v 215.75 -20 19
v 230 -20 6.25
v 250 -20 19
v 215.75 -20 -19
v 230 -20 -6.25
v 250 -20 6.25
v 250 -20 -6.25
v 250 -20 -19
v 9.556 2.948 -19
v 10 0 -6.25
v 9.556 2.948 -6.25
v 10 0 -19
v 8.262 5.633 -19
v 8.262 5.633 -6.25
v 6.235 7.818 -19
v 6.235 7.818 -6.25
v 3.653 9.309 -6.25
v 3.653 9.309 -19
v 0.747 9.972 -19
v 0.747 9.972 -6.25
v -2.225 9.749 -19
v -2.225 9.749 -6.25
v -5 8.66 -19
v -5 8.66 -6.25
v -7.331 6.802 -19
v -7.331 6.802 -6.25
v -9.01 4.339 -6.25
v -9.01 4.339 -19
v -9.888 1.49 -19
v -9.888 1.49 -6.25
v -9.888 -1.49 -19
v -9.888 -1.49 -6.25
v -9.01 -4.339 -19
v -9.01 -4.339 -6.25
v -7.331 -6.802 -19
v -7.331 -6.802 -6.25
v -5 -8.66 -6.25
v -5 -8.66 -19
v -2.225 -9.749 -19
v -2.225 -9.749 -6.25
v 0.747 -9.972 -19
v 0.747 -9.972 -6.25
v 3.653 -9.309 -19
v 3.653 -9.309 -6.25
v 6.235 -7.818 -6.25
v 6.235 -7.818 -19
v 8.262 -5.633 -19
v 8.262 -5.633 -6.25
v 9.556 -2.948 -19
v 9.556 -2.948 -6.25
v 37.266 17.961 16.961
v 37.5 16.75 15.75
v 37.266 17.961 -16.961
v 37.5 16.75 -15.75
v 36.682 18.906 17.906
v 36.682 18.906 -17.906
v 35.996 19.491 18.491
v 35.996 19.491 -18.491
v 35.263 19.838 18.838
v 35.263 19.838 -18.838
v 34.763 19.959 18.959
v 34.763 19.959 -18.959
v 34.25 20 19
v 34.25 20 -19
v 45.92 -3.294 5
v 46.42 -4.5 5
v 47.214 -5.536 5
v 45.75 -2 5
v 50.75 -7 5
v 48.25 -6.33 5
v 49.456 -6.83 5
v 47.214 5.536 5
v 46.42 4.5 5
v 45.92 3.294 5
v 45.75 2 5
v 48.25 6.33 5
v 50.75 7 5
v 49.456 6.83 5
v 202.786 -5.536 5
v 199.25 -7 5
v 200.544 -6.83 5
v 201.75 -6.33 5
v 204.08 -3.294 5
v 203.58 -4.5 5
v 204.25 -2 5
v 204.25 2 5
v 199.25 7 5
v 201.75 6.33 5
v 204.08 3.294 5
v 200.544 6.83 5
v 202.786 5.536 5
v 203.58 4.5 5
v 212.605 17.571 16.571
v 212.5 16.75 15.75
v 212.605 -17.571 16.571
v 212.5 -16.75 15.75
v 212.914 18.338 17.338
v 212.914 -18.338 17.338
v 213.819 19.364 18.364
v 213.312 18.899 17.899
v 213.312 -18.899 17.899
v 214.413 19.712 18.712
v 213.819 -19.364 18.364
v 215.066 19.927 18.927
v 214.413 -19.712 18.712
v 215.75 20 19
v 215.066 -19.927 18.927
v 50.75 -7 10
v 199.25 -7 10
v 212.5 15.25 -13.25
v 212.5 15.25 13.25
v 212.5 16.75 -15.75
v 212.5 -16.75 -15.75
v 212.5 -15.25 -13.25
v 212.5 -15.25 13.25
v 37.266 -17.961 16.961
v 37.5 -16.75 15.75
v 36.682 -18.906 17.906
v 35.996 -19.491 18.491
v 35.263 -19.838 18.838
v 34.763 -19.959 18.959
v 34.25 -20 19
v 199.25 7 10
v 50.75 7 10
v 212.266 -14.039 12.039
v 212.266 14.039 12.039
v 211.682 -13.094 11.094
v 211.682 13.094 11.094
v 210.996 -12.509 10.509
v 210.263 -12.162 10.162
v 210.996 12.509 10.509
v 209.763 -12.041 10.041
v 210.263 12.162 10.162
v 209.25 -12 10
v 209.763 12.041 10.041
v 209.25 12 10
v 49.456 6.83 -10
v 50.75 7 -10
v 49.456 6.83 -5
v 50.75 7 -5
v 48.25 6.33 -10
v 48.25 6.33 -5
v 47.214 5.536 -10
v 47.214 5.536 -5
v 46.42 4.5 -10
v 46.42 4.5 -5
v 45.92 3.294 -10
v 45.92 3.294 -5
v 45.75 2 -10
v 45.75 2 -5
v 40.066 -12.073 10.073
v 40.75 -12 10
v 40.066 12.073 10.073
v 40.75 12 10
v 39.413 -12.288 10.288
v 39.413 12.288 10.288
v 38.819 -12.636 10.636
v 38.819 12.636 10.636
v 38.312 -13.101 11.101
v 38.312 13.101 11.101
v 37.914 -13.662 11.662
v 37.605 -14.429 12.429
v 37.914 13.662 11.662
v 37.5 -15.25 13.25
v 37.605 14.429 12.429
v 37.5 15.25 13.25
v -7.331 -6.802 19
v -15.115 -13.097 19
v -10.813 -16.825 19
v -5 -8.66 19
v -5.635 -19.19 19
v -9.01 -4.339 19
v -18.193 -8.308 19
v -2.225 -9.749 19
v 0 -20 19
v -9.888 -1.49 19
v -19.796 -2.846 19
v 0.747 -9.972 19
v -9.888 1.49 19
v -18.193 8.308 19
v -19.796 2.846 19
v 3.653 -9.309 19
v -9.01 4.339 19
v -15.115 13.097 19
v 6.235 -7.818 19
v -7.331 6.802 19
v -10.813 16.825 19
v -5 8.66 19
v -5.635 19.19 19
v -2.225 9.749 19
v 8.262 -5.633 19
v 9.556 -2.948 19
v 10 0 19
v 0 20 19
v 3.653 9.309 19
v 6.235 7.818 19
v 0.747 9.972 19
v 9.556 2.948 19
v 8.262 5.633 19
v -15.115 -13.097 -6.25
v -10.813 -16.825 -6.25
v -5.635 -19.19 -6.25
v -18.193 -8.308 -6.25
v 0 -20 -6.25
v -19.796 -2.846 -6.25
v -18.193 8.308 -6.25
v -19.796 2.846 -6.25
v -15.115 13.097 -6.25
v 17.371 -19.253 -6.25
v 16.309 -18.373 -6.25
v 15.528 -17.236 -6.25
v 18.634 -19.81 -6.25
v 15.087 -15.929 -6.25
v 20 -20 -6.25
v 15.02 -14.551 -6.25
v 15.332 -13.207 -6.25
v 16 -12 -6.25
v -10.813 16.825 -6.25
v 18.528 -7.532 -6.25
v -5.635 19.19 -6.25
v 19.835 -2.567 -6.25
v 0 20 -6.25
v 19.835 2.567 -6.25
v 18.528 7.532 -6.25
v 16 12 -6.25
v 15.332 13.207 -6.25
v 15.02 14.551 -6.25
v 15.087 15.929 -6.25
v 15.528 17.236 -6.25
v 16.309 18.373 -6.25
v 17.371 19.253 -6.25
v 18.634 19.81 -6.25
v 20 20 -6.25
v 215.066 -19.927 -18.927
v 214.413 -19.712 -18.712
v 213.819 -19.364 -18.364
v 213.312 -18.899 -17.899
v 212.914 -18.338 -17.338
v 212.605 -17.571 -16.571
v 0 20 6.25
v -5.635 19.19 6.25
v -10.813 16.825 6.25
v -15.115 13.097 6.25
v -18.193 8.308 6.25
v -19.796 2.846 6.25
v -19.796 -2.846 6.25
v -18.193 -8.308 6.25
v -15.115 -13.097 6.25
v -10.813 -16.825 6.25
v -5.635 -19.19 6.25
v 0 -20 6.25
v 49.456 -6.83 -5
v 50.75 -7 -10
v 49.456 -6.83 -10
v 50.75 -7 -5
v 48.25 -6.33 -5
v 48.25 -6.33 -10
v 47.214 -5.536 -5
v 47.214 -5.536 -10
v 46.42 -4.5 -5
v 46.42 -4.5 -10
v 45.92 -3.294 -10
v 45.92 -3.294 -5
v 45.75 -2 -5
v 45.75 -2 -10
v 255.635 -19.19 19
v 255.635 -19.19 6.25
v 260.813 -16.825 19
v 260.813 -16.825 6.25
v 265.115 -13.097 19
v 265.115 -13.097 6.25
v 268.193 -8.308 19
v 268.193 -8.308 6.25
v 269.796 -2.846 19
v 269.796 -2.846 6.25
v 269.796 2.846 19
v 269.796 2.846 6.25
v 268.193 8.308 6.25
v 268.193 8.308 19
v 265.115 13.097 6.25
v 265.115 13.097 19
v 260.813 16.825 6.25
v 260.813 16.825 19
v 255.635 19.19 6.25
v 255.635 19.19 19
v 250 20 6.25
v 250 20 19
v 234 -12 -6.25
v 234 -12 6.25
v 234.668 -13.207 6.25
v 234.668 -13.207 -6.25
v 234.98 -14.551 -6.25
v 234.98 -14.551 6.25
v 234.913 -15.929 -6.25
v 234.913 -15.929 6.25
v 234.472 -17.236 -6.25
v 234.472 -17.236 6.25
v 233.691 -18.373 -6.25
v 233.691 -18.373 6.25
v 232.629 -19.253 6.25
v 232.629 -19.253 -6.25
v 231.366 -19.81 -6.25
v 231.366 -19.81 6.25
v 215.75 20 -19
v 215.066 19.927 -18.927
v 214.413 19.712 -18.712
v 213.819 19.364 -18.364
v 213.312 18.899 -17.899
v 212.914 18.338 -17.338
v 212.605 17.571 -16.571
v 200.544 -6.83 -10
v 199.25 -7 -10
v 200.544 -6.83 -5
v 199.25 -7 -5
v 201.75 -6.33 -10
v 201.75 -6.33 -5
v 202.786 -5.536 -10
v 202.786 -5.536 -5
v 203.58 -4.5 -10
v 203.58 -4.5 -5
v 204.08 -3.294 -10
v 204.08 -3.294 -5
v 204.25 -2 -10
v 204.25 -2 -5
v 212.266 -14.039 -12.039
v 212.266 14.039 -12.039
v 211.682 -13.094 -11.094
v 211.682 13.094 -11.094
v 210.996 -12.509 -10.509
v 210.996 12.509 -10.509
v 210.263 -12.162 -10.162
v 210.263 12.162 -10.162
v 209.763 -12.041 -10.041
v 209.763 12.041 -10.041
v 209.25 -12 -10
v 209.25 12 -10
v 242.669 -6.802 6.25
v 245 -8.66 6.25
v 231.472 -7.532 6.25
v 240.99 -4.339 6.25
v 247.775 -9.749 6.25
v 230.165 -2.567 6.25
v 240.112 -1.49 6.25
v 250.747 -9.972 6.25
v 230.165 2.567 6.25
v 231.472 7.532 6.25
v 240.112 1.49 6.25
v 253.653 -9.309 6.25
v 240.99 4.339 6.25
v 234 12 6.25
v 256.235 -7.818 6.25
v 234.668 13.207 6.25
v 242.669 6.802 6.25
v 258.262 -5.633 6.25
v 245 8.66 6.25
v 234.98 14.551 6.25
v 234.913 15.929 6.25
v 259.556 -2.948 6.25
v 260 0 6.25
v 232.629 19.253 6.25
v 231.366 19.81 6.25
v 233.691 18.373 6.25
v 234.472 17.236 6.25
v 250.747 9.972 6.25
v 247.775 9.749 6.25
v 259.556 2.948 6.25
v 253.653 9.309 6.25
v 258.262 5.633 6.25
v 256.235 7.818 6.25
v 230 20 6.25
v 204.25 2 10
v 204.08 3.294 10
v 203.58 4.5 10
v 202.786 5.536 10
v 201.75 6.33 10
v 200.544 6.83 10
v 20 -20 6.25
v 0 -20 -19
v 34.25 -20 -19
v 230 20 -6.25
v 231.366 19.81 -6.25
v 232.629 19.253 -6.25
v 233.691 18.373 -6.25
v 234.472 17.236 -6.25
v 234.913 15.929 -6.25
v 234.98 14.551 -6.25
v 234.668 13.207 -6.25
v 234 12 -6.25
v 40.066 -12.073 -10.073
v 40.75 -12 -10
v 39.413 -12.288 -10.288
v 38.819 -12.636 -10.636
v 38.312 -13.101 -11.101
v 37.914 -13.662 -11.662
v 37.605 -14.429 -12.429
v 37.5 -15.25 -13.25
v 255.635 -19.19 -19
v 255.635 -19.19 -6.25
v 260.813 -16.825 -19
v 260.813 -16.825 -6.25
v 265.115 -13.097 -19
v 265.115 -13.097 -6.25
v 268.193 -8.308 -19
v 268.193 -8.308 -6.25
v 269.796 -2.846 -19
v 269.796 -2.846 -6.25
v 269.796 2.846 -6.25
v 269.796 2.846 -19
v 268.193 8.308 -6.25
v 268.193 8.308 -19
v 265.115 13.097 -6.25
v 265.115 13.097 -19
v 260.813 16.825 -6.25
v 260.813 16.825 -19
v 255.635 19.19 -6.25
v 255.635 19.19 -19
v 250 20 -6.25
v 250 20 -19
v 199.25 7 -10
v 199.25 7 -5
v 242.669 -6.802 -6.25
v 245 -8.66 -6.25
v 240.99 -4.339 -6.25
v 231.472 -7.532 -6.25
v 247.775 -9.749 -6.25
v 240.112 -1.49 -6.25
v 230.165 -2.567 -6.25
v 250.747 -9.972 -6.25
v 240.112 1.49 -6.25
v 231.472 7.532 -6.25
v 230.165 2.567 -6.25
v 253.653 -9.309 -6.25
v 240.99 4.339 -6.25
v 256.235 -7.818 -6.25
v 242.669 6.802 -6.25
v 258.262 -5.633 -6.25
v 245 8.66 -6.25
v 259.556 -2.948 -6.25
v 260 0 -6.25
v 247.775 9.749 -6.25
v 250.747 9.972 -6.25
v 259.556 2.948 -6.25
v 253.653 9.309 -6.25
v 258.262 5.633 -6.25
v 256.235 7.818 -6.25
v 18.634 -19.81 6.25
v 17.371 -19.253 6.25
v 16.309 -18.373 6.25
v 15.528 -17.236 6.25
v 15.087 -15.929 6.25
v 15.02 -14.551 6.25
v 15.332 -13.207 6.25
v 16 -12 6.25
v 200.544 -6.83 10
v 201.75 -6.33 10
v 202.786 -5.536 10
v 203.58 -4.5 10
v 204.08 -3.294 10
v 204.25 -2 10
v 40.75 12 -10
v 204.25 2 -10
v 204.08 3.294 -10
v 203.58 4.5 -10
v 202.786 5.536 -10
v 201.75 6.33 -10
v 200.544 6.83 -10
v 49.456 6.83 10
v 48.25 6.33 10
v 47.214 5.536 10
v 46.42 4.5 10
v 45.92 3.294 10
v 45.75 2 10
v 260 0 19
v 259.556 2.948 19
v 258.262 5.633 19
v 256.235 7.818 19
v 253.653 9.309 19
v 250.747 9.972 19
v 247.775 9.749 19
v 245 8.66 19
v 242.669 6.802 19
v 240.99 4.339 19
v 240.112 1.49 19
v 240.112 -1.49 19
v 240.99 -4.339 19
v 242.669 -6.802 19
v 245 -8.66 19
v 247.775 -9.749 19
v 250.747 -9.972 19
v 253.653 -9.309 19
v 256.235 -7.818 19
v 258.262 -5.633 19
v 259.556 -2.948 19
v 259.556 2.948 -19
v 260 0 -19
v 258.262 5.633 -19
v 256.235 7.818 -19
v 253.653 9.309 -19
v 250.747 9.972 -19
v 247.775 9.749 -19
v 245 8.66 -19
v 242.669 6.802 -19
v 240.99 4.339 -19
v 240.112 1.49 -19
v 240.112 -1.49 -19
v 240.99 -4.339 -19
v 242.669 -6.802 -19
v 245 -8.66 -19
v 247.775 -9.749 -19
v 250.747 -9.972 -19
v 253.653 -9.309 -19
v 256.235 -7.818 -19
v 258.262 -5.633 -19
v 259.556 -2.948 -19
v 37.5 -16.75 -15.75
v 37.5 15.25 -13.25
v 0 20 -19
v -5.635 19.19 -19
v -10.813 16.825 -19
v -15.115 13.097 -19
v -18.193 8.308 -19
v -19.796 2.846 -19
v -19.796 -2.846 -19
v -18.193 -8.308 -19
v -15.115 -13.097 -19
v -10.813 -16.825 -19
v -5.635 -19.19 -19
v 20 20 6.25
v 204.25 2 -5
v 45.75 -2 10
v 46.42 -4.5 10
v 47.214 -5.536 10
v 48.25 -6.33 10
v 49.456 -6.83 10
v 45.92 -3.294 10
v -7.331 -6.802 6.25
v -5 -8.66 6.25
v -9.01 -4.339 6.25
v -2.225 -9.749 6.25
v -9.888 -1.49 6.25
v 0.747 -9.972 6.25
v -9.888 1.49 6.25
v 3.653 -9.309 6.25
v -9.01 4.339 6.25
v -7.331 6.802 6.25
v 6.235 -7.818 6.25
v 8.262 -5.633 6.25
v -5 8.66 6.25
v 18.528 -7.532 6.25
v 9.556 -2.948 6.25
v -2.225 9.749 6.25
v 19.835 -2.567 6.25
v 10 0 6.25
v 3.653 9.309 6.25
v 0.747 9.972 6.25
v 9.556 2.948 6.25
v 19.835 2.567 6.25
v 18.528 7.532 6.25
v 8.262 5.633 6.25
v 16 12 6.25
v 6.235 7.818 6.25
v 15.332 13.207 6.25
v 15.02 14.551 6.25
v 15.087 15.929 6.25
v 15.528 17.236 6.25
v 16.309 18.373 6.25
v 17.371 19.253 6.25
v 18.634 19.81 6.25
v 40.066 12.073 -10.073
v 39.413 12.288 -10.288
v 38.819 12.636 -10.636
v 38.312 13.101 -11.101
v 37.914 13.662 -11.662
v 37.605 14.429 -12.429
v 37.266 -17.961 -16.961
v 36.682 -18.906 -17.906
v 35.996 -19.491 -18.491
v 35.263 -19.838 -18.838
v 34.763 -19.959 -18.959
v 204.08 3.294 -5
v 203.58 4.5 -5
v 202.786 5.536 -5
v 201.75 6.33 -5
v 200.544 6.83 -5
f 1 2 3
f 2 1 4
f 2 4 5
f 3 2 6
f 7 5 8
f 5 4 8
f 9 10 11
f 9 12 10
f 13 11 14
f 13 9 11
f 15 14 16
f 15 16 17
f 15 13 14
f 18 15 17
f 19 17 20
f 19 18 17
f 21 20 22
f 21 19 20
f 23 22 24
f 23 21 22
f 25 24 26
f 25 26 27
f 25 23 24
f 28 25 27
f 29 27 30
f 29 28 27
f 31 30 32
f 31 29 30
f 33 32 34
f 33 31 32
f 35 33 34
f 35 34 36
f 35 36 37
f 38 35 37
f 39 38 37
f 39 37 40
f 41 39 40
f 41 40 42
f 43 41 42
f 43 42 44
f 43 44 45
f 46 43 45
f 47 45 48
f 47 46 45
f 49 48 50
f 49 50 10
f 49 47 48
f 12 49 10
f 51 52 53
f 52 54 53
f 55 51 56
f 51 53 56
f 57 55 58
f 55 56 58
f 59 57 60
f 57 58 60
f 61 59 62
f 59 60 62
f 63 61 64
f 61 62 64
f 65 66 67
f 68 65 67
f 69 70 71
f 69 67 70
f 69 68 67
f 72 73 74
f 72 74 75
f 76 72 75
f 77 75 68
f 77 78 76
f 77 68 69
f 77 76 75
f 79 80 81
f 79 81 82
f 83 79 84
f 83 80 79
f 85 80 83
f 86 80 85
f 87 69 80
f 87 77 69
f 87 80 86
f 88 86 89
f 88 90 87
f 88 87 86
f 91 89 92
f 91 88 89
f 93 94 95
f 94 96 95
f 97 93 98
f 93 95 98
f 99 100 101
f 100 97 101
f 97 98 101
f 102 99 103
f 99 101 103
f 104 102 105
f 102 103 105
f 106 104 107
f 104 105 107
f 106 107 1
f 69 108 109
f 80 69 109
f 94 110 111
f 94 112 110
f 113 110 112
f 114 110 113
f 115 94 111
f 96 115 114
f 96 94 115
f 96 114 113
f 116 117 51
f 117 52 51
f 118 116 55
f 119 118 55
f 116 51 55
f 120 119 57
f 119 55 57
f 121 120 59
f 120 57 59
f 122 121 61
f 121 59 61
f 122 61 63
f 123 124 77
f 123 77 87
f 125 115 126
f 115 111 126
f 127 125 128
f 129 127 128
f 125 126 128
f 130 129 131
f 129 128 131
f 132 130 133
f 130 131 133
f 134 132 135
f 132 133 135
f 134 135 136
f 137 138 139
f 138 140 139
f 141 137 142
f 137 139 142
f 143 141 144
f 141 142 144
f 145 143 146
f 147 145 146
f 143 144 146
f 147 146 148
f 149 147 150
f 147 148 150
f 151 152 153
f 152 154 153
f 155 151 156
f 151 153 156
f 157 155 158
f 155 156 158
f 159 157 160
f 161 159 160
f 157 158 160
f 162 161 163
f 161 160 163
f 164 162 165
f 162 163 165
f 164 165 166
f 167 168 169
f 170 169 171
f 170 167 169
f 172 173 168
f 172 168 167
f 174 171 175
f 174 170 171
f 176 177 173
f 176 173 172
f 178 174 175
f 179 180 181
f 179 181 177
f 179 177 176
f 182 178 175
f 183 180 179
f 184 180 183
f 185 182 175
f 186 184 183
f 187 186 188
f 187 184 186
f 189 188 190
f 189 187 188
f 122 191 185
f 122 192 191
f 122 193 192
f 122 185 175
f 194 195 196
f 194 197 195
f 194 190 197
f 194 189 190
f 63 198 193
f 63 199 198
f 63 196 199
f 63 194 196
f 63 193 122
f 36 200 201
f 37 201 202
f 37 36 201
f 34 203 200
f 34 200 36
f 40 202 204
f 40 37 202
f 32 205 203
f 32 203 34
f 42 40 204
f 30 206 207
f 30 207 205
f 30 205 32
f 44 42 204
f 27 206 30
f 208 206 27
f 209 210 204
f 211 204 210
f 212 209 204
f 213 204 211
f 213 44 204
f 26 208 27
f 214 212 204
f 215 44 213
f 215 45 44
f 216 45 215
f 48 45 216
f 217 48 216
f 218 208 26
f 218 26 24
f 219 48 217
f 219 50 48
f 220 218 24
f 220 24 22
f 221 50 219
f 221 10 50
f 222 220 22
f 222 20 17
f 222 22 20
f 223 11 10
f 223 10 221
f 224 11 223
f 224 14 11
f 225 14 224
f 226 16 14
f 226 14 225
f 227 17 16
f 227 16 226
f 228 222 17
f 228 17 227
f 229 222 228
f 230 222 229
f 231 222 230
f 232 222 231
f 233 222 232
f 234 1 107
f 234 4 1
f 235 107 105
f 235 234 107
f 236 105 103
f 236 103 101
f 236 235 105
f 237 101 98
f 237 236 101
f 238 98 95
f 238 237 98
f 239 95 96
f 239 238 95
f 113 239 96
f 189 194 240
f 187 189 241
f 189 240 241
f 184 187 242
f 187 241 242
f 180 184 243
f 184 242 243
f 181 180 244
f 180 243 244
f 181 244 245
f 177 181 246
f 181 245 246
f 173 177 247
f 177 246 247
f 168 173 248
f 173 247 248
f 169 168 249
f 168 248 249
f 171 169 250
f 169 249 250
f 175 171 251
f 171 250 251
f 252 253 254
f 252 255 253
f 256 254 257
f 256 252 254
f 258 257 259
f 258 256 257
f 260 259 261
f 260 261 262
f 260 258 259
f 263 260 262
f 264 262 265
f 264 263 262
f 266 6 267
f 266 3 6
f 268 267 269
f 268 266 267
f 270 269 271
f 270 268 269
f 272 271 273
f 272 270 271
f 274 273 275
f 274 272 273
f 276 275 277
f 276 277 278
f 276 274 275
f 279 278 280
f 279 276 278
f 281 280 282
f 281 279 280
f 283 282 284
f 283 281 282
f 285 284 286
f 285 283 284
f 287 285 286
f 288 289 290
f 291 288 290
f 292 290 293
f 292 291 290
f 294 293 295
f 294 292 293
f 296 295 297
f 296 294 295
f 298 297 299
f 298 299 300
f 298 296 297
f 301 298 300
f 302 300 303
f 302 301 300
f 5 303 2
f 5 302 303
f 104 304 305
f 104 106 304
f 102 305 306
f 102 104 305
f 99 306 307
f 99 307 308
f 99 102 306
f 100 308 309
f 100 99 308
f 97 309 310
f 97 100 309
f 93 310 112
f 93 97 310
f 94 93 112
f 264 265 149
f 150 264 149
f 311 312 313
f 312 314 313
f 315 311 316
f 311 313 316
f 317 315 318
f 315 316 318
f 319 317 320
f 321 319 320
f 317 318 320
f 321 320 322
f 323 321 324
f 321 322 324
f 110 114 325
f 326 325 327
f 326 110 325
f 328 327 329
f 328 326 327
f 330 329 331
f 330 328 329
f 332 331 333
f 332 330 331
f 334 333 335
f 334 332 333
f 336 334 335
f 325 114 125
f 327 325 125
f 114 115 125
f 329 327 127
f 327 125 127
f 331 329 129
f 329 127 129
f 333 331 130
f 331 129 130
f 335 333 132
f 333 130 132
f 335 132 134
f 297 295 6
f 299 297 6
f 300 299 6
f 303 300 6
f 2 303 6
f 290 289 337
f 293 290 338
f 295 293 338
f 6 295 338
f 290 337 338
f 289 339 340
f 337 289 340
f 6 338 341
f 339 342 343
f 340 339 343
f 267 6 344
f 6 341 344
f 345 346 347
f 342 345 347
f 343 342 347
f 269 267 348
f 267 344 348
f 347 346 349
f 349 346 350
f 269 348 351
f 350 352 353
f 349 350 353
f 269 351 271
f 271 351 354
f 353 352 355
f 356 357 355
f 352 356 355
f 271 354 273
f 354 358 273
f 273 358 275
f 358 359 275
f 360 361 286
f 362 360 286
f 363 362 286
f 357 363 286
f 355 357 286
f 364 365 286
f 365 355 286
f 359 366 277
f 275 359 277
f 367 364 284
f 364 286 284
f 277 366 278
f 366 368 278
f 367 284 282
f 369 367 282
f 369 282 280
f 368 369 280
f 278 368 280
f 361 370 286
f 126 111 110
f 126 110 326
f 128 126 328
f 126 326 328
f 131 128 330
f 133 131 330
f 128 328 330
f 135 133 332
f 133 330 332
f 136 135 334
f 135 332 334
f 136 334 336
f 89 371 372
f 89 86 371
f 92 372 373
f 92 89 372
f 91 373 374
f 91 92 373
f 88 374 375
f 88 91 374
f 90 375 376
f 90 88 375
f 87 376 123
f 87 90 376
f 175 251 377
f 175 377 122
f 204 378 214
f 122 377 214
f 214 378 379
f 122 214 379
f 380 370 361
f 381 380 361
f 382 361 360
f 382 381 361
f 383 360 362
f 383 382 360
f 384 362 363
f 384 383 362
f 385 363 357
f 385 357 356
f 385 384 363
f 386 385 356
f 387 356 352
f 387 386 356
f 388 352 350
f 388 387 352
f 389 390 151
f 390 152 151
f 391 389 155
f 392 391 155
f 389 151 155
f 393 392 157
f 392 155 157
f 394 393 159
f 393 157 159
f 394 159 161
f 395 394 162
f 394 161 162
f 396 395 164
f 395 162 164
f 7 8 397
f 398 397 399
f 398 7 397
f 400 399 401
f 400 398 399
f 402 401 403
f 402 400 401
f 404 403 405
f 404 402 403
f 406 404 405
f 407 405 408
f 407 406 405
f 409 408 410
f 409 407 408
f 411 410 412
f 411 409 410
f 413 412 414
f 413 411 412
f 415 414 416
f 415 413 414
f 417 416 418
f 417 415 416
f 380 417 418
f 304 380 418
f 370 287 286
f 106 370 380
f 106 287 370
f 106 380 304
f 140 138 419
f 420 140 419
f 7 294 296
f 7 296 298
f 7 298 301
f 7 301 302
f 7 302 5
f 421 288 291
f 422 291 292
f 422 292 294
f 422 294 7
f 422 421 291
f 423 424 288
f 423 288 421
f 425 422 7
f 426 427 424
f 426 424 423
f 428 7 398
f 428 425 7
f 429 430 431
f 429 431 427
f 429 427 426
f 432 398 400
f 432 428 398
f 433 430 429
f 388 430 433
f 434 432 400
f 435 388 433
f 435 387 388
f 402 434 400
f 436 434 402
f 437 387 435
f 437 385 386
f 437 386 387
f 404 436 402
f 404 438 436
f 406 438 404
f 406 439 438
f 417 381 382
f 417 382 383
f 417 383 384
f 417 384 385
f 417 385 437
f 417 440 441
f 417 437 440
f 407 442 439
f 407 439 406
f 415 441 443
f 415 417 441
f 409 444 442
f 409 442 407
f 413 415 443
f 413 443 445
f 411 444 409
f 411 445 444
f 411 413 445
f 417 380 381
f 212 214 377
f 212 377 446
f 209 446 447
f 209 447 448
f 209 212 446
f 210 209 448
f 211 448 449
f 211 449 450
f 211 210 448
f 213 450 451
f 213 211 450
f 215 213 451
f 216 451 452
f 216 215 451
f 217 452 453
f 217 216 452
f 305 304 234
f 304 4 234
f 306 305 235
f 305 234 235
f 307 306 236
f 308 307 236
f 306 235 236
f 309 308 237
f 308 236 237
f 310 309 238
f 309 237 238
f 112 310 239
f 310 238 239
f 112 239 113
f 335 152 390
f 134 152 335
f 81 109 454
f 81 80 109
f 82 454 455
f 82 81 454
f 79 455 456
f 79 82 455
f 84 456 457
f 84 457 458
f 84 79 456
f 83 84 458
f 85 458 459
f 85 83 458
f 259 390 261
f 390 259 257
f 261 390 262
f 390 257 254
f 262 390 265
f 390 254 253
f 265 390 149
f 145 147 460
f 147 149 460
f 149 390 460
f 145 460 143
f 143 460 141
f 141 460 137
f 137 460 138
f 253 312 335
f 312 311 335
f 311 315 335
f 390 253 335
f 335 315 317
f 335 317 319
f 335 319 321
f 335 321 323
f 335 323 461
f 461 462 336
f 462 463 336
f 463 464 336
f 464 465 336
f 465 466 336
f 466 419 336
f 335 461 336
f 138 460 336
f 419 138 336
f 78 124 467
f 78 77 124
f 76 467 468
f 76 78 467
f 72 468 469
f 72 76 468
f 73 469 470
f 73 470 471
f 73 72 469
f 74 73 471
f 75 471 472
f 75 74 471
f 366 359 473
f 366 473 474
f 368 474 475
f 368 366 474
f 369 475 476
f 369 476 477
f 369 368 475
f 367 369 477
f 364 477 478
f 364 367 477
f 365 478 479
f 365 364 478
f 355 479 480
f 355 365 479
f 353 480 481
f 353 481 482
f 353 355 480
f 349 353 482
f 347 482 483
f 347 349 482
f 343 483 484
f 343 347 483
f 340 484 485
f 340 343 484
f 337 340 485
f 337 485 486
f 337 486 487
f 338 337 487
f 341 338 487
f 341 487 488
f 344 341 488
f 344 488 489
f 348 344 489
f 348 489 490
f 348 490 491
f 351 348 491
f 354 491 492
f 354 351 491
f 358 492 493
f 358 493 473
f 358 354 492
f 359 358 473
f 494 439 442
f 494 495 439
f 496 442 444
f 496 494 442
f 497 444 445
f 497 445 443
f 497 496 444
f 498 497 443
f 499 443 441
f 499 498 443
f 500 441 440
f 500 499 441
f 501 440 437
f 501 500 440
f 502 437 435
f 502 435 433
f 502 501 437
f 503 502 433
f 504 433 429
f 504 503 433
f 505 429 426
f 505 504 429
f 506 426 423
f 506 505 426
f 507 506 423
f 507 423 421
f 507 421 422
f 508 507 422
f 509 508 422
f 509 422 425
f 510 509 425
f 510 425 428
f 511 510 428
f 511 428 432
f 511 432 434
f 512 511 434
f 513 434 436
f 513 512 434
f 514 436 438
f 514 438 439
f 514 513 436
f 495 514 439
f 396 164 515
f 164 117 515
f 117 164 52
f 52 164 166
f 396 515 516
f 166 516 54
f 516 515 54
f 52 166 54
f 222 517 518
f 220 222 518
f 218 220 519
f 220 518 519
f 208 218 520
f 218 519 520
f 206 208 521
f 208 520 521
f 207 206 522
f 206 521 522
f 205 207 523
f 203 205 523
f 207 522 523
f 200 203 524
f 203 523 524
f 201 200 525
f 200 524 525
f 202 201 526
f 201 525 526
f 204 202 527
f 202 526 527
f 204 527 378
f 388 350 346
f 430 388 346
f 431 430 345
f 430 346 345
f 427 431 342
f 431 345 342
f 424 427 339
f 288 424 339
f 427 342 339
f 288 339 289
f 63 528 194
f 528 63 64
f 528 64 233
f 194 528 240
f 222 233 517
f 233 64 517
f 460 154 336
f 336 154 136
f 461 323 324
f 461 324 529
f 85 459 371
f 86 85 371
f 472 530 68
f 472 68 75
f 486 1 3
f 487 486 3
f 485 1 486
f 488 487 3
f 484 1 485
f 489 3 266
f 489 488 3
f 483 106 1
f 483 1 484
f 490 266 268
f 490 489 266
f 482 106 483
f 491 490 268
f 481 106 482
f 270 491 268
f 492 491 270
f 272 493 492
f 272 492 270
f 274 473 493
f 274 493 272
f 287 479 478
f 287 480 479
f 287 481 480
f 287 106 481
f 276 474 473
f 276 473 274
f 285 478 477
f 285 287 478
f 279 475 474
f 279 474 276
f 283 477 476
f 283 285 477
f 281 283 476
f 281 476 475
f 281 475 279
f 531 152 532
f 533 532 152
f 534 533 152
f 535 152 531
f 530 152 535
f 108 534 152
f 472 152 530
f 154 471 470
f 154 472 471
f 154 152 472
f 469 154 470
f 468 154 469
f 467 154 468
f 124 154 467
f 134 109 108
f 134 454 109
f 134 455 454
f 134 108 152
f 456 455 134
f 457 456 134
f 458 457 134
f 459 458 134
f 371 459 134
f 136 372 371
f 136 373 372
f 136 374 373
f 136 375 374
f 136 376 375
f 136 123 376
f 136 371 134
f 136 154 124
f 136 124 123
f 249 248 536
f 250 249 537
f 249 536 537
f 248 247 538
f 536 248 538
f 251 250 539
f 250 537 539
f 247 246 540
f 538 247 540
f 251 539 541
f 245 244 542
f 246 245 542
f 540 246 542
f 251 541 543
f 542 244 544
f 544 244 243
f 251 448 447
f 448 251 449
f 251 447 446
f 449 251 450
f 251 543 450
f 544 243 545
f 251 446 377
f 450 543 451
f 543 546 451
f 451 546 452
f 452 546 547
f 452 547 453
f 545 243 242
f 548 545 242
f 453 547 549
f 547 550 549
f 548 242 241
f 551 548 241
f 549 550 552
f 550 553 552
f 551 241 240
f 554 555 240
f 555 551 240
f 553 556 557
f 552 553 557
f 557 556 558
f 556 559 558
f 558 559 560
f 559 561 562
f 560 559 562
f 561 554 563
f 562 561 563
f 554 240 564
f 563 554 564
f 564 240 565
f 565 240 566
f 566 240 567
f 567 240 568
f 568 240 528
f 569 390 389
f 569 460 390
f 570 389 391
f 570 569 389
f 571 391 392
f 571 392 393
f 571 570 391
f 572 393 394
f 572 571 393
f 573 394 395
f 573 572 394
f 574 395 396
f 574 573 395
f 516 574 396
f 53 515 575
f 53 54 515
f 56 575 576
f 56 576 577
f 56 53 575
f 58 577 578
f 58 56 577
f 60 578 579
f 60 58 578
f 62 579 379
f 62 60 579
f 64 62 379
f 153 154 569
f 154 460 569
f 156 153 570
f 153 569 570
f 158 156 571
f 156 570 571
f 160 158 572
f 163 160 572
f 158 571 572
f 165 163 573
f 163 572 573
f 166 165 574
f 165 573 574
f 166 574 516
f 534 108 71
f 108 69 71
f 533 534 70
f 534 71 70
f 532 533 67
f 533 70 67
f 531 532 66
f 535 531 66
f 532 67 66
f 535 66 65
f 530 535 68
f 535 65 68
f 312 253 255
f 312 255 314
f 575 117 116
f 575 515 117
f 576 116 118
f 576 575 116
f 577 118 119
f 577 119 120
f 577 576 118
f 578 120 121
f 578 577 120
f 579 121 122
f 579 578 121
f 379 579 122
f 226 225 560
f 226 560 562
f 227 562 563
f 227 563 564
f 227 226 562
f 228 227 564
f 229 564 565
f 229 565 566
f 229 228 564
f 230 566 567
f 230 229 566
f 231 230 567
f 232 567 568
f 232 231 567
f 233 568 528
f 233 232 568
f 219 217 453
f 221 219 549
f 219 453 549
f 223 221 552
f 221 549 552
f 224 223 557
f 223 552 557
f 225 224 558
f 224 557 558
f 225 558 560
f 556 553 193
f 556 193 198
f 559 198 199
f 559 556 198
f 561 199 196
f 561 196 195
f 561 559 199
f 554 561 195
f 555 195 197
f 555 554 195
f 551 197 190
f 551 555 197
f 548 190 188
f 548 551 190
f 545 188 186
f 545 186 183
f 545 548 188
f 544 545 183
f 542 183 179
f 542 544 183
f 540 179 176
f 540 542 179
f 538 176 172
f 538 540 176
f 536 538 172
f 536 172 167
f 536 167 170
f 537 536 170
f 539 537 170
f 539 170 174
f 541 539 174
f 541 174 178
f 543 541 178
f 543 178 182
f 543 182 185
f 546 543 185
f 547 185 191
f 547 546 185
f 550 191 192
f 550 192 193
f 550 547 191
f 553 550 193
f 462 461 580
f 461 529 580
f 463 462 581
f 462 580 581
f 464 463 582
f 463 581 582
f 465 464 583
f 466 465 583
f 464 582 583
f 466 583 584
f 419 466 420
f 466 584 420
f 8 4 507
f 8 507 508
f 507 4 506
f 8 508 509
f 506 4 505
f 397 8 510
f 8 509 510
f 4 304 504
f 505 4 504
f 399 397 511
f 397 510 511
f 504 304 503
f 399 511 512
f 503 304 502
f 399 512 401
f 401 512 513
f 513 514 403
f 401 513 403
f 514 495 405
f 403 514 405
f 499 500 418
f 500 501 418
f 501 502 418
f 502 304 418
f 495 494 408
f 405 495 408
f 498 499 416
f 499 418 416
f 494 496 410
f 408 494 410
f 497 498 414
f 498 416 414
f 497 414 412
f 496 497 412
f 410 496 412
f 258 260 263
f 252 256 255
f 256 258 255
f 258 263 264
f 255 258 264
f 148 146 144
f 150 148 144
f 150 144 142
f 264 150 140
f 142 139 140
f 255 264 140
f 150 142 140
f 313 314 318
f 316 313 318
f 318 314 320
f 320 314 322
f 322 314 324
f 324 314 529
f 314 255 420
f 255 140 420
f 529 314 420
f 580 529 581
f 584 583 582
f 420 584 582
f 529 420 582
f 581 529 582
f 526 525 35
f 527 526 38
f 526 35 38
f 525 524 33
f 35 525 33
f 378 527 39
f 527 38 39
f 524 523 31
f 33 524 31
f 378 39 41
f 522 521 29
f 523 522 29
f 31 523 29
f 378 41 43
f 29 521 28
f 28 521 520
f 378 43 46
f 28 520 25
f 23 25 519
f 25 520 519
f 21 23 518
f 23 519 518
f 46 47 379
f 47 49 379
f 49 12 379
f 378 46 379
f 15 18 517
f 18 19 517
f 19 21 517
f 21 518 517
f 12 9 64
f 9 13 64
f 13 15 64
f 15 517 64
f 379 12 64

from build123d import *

# Parameters (mm, degrees)
SKETCH1_W            = 175
SKETCH1_H            = 24
BOSS_EXTRUDE3_DEPTH  = 10
SKETCH1_6_R          = 20
SKETCH1_6_R_2        = 10
HEAD_WIDTH_DEPTH     = 19
SKETCH1_7_R          = 20
SKETCH1_7_R_2        = 10
CUT_EXTRUDE1_DEPTH   = 6.25
FILLET1_START        = -6.25
FILLET1_DEPTH        = 12.5
FILLET2_R            = 3.25
SKETCH2_W            = 158.5
SKETCH2_H            = 14
CUT_EXTRUDE2_DEPTH   = 5
FILLET3_R            = 5
FILLET3_OF_MIRROR1_R = 5


with BuildPart() as part:
    # Sketch1 → Boss-Extrude3 (new, symmetric)
    with BuildSketch(Plane.XY):
        with Locations((125, 0)):
            Rectangle(SKETCH1_W, SKETCH1_H)
    extrude(amount=BOSS_EXTRUDE3_DEPTH, both=True)

    # Sketch1<6> → Head Width (add, symmetric)
    # profile 1 of 4: a face of its own
    with BuildSketch(Plane.XY):
        with BuildLine():
            Line((37.5, -12), (37.5, 12))
            Line((37.5, 12), (37.5, 20))
            Line((37.5, 20), (0, 20))
            ThreePointArc((0, 20), (14.142135624, 14.142135624), (20, 0))
            ThreePointArc((20, 0), (14.142135624, -14.142135624), (0, -20))
            Line((0, -20), (37.5, -20))
            Line((37.5, -20), (37.5, -12))
        make_face()
    # profile 2 of 4: a face of its own
    with BuildSketch(Plane.XY):
        Circle(SKETCH1_6_R)
        Circle(SKETCH1_6_R_2, mode=Mode.SUBTRACT)
    # profile 3 of 4: a face of its own
    with BuildSketch(Plane.XY):
        with BuildLine():
            Line((212.5, 20), (212.5, 12))
            Line((212.5, 12), (212.5, -12))
            Line((212.5, -12), (212.5, -20))
            Line((212.5, -20), (250, -20))
            ThreePointArc((250, -20), (230, 0), (250, 20))
            Line((250, 20), (212.5, 20))
        make_face()
    # profile 4 of 4: a face of its own
    with BuildSketch(Plane.XY):
        with Locations((250, 0)):
            Circle(SKETCH1_6_R)
        with Locations((250, 0)):
            Circle(SKETCH1_6_R_2, mode=Mode.SUBTRACT)
    extrude(amount=HEAD_WIDTH_DEPTH, both=True)

    # Sketch1<7> → Cut-Extrude1 (cut, symmetric)
    # profile 1 of 2: a face of its own
    with BuildSketch(Plane.XY):
        Circle(SKETCH1_7_R)
        Circle(SKETCH1_7_R_2, mode=Mode.SUBTRACT)
    # profile 2 of 2: a face of its own
    with BuildSketch(Plane.XY):
        with Locations((250, 0)):
            Circle(SKETCH1_7_R)
        with Locations((250, 0)):
            Circle(SKETCH1_7_R_2, mode=Mode.SUBTRACT)
    extrude(amount=CUT_EXTRUDE1_DEPTH, both=True, mode=Mode.SUBTRACT)

    # Fillet1: read off the stored shape, not the designer's step
    # Fillet1 outline → Fillet1 (cut)
    with BuildSketch(Plane.XY.offset(FILLET1_START)):
        with BuildLine():
            ThreePointArc((230, 20), (234.472135955, 17.236067977), (234, 12))
            ThreePointArc((234, 12), (241.05572809, 17.88854382), (250, 20))
            Line((250, 20), (230, 20))
        make_face()
        with BuildLine():
            ThreePointArc((234, -12), (234.472135955, -17.236067977), (230, -20))
            Line((230, -20), (250, -20))
            ThreePointArc((250, -20), (241.05572809, -17.88854382), (234, -12))
        make_face()
        with BuildLine():
            ThreePointArc((20, -20), (15.527864045, -17.236067977), (16, -12))
            ThreePointArc((16, -12), (8.94427191, -17.88854382), (0, -20))
            Line((0, -20), (20, -20))
        make_face()
        with BuildLine():
            ThreePointArc((0, 20), (8.94427191, 17.88854382), (16, 12))
            ThreePointArc((16, 12), (15.527864045, 17.236067977), (20, 20))
            Line((20, 20), (0, 20))
        make_face()
    extrude(amount=FILLET1_DEPTH, mode=Mode.SUBTRACT)

    # Fillet2
    fillet2_edges = [part.edges().sort_by_distance(p)[0] for p in [
        (37.5, 0, 10),
        (37.5, 20, 0),
        (37.5, 0, 19),
        (37.5, -20, 0),
        (37.5, 0, -19),
        (212.5, -20, 0),
        (212.5, 0, -19),
        (212.5, 20, 0),
        (212.5, 0, 19),
        (212.5, 0, 10),
        (37.5, 0, -10),
        (212.5, 0, -10),
        (212.5, -12, 0),
        (37.5, -12, 0),
        (37.5, 12, 0),
        (212.5, 12, 0),
    ]]
    fillet(fillet2_edges, radius=FILLET2_R)

    # Sketch2 → Cut-Extrude2 (cut)
    with BuildSketch(Plane.XY.offset(10)):
        with Locations((125, 0)):
            Rectangle(SKETCH2_W, SKETCH2_H)
    cut_extrude2 = extrude(amount=-CUT_EXTRUDE2_DEPTH, mode=Mode.SUBTRACT)

    # Fillet3
    fillet3_edges = [part.edges().sort_by_distance(p)[0] for p in [
        (45.75, -7, 7.5),
        (45.75, 7, 7.5),
        (204.25, 7, 7.5),
        (204.25, -7, 7.5),
    ]]
    fillet(fillet3_edges, radius=FILLET3_R)

    # Mirror1: Cut-Extrude2 across plane
    add(cut_extrude2.mirror(Plane.XY), mode=Mode.SUBTRACT)

    # Fillet3 of Mirror1
    fillet3_of_mirror1_edges = [part.edges().sort_by_distance(p)[0] for p in [
        (45.75, -7, -7.5),
        (45.75, 7, -7.5),
        (204.25, 7, -7.5),
        (204.25, -7, -7.5),
    ]]
    fillet(fillet3_of_mirror1_edges, radius=FILLET3_OF_MIRROR1_R)


solid = part.part
